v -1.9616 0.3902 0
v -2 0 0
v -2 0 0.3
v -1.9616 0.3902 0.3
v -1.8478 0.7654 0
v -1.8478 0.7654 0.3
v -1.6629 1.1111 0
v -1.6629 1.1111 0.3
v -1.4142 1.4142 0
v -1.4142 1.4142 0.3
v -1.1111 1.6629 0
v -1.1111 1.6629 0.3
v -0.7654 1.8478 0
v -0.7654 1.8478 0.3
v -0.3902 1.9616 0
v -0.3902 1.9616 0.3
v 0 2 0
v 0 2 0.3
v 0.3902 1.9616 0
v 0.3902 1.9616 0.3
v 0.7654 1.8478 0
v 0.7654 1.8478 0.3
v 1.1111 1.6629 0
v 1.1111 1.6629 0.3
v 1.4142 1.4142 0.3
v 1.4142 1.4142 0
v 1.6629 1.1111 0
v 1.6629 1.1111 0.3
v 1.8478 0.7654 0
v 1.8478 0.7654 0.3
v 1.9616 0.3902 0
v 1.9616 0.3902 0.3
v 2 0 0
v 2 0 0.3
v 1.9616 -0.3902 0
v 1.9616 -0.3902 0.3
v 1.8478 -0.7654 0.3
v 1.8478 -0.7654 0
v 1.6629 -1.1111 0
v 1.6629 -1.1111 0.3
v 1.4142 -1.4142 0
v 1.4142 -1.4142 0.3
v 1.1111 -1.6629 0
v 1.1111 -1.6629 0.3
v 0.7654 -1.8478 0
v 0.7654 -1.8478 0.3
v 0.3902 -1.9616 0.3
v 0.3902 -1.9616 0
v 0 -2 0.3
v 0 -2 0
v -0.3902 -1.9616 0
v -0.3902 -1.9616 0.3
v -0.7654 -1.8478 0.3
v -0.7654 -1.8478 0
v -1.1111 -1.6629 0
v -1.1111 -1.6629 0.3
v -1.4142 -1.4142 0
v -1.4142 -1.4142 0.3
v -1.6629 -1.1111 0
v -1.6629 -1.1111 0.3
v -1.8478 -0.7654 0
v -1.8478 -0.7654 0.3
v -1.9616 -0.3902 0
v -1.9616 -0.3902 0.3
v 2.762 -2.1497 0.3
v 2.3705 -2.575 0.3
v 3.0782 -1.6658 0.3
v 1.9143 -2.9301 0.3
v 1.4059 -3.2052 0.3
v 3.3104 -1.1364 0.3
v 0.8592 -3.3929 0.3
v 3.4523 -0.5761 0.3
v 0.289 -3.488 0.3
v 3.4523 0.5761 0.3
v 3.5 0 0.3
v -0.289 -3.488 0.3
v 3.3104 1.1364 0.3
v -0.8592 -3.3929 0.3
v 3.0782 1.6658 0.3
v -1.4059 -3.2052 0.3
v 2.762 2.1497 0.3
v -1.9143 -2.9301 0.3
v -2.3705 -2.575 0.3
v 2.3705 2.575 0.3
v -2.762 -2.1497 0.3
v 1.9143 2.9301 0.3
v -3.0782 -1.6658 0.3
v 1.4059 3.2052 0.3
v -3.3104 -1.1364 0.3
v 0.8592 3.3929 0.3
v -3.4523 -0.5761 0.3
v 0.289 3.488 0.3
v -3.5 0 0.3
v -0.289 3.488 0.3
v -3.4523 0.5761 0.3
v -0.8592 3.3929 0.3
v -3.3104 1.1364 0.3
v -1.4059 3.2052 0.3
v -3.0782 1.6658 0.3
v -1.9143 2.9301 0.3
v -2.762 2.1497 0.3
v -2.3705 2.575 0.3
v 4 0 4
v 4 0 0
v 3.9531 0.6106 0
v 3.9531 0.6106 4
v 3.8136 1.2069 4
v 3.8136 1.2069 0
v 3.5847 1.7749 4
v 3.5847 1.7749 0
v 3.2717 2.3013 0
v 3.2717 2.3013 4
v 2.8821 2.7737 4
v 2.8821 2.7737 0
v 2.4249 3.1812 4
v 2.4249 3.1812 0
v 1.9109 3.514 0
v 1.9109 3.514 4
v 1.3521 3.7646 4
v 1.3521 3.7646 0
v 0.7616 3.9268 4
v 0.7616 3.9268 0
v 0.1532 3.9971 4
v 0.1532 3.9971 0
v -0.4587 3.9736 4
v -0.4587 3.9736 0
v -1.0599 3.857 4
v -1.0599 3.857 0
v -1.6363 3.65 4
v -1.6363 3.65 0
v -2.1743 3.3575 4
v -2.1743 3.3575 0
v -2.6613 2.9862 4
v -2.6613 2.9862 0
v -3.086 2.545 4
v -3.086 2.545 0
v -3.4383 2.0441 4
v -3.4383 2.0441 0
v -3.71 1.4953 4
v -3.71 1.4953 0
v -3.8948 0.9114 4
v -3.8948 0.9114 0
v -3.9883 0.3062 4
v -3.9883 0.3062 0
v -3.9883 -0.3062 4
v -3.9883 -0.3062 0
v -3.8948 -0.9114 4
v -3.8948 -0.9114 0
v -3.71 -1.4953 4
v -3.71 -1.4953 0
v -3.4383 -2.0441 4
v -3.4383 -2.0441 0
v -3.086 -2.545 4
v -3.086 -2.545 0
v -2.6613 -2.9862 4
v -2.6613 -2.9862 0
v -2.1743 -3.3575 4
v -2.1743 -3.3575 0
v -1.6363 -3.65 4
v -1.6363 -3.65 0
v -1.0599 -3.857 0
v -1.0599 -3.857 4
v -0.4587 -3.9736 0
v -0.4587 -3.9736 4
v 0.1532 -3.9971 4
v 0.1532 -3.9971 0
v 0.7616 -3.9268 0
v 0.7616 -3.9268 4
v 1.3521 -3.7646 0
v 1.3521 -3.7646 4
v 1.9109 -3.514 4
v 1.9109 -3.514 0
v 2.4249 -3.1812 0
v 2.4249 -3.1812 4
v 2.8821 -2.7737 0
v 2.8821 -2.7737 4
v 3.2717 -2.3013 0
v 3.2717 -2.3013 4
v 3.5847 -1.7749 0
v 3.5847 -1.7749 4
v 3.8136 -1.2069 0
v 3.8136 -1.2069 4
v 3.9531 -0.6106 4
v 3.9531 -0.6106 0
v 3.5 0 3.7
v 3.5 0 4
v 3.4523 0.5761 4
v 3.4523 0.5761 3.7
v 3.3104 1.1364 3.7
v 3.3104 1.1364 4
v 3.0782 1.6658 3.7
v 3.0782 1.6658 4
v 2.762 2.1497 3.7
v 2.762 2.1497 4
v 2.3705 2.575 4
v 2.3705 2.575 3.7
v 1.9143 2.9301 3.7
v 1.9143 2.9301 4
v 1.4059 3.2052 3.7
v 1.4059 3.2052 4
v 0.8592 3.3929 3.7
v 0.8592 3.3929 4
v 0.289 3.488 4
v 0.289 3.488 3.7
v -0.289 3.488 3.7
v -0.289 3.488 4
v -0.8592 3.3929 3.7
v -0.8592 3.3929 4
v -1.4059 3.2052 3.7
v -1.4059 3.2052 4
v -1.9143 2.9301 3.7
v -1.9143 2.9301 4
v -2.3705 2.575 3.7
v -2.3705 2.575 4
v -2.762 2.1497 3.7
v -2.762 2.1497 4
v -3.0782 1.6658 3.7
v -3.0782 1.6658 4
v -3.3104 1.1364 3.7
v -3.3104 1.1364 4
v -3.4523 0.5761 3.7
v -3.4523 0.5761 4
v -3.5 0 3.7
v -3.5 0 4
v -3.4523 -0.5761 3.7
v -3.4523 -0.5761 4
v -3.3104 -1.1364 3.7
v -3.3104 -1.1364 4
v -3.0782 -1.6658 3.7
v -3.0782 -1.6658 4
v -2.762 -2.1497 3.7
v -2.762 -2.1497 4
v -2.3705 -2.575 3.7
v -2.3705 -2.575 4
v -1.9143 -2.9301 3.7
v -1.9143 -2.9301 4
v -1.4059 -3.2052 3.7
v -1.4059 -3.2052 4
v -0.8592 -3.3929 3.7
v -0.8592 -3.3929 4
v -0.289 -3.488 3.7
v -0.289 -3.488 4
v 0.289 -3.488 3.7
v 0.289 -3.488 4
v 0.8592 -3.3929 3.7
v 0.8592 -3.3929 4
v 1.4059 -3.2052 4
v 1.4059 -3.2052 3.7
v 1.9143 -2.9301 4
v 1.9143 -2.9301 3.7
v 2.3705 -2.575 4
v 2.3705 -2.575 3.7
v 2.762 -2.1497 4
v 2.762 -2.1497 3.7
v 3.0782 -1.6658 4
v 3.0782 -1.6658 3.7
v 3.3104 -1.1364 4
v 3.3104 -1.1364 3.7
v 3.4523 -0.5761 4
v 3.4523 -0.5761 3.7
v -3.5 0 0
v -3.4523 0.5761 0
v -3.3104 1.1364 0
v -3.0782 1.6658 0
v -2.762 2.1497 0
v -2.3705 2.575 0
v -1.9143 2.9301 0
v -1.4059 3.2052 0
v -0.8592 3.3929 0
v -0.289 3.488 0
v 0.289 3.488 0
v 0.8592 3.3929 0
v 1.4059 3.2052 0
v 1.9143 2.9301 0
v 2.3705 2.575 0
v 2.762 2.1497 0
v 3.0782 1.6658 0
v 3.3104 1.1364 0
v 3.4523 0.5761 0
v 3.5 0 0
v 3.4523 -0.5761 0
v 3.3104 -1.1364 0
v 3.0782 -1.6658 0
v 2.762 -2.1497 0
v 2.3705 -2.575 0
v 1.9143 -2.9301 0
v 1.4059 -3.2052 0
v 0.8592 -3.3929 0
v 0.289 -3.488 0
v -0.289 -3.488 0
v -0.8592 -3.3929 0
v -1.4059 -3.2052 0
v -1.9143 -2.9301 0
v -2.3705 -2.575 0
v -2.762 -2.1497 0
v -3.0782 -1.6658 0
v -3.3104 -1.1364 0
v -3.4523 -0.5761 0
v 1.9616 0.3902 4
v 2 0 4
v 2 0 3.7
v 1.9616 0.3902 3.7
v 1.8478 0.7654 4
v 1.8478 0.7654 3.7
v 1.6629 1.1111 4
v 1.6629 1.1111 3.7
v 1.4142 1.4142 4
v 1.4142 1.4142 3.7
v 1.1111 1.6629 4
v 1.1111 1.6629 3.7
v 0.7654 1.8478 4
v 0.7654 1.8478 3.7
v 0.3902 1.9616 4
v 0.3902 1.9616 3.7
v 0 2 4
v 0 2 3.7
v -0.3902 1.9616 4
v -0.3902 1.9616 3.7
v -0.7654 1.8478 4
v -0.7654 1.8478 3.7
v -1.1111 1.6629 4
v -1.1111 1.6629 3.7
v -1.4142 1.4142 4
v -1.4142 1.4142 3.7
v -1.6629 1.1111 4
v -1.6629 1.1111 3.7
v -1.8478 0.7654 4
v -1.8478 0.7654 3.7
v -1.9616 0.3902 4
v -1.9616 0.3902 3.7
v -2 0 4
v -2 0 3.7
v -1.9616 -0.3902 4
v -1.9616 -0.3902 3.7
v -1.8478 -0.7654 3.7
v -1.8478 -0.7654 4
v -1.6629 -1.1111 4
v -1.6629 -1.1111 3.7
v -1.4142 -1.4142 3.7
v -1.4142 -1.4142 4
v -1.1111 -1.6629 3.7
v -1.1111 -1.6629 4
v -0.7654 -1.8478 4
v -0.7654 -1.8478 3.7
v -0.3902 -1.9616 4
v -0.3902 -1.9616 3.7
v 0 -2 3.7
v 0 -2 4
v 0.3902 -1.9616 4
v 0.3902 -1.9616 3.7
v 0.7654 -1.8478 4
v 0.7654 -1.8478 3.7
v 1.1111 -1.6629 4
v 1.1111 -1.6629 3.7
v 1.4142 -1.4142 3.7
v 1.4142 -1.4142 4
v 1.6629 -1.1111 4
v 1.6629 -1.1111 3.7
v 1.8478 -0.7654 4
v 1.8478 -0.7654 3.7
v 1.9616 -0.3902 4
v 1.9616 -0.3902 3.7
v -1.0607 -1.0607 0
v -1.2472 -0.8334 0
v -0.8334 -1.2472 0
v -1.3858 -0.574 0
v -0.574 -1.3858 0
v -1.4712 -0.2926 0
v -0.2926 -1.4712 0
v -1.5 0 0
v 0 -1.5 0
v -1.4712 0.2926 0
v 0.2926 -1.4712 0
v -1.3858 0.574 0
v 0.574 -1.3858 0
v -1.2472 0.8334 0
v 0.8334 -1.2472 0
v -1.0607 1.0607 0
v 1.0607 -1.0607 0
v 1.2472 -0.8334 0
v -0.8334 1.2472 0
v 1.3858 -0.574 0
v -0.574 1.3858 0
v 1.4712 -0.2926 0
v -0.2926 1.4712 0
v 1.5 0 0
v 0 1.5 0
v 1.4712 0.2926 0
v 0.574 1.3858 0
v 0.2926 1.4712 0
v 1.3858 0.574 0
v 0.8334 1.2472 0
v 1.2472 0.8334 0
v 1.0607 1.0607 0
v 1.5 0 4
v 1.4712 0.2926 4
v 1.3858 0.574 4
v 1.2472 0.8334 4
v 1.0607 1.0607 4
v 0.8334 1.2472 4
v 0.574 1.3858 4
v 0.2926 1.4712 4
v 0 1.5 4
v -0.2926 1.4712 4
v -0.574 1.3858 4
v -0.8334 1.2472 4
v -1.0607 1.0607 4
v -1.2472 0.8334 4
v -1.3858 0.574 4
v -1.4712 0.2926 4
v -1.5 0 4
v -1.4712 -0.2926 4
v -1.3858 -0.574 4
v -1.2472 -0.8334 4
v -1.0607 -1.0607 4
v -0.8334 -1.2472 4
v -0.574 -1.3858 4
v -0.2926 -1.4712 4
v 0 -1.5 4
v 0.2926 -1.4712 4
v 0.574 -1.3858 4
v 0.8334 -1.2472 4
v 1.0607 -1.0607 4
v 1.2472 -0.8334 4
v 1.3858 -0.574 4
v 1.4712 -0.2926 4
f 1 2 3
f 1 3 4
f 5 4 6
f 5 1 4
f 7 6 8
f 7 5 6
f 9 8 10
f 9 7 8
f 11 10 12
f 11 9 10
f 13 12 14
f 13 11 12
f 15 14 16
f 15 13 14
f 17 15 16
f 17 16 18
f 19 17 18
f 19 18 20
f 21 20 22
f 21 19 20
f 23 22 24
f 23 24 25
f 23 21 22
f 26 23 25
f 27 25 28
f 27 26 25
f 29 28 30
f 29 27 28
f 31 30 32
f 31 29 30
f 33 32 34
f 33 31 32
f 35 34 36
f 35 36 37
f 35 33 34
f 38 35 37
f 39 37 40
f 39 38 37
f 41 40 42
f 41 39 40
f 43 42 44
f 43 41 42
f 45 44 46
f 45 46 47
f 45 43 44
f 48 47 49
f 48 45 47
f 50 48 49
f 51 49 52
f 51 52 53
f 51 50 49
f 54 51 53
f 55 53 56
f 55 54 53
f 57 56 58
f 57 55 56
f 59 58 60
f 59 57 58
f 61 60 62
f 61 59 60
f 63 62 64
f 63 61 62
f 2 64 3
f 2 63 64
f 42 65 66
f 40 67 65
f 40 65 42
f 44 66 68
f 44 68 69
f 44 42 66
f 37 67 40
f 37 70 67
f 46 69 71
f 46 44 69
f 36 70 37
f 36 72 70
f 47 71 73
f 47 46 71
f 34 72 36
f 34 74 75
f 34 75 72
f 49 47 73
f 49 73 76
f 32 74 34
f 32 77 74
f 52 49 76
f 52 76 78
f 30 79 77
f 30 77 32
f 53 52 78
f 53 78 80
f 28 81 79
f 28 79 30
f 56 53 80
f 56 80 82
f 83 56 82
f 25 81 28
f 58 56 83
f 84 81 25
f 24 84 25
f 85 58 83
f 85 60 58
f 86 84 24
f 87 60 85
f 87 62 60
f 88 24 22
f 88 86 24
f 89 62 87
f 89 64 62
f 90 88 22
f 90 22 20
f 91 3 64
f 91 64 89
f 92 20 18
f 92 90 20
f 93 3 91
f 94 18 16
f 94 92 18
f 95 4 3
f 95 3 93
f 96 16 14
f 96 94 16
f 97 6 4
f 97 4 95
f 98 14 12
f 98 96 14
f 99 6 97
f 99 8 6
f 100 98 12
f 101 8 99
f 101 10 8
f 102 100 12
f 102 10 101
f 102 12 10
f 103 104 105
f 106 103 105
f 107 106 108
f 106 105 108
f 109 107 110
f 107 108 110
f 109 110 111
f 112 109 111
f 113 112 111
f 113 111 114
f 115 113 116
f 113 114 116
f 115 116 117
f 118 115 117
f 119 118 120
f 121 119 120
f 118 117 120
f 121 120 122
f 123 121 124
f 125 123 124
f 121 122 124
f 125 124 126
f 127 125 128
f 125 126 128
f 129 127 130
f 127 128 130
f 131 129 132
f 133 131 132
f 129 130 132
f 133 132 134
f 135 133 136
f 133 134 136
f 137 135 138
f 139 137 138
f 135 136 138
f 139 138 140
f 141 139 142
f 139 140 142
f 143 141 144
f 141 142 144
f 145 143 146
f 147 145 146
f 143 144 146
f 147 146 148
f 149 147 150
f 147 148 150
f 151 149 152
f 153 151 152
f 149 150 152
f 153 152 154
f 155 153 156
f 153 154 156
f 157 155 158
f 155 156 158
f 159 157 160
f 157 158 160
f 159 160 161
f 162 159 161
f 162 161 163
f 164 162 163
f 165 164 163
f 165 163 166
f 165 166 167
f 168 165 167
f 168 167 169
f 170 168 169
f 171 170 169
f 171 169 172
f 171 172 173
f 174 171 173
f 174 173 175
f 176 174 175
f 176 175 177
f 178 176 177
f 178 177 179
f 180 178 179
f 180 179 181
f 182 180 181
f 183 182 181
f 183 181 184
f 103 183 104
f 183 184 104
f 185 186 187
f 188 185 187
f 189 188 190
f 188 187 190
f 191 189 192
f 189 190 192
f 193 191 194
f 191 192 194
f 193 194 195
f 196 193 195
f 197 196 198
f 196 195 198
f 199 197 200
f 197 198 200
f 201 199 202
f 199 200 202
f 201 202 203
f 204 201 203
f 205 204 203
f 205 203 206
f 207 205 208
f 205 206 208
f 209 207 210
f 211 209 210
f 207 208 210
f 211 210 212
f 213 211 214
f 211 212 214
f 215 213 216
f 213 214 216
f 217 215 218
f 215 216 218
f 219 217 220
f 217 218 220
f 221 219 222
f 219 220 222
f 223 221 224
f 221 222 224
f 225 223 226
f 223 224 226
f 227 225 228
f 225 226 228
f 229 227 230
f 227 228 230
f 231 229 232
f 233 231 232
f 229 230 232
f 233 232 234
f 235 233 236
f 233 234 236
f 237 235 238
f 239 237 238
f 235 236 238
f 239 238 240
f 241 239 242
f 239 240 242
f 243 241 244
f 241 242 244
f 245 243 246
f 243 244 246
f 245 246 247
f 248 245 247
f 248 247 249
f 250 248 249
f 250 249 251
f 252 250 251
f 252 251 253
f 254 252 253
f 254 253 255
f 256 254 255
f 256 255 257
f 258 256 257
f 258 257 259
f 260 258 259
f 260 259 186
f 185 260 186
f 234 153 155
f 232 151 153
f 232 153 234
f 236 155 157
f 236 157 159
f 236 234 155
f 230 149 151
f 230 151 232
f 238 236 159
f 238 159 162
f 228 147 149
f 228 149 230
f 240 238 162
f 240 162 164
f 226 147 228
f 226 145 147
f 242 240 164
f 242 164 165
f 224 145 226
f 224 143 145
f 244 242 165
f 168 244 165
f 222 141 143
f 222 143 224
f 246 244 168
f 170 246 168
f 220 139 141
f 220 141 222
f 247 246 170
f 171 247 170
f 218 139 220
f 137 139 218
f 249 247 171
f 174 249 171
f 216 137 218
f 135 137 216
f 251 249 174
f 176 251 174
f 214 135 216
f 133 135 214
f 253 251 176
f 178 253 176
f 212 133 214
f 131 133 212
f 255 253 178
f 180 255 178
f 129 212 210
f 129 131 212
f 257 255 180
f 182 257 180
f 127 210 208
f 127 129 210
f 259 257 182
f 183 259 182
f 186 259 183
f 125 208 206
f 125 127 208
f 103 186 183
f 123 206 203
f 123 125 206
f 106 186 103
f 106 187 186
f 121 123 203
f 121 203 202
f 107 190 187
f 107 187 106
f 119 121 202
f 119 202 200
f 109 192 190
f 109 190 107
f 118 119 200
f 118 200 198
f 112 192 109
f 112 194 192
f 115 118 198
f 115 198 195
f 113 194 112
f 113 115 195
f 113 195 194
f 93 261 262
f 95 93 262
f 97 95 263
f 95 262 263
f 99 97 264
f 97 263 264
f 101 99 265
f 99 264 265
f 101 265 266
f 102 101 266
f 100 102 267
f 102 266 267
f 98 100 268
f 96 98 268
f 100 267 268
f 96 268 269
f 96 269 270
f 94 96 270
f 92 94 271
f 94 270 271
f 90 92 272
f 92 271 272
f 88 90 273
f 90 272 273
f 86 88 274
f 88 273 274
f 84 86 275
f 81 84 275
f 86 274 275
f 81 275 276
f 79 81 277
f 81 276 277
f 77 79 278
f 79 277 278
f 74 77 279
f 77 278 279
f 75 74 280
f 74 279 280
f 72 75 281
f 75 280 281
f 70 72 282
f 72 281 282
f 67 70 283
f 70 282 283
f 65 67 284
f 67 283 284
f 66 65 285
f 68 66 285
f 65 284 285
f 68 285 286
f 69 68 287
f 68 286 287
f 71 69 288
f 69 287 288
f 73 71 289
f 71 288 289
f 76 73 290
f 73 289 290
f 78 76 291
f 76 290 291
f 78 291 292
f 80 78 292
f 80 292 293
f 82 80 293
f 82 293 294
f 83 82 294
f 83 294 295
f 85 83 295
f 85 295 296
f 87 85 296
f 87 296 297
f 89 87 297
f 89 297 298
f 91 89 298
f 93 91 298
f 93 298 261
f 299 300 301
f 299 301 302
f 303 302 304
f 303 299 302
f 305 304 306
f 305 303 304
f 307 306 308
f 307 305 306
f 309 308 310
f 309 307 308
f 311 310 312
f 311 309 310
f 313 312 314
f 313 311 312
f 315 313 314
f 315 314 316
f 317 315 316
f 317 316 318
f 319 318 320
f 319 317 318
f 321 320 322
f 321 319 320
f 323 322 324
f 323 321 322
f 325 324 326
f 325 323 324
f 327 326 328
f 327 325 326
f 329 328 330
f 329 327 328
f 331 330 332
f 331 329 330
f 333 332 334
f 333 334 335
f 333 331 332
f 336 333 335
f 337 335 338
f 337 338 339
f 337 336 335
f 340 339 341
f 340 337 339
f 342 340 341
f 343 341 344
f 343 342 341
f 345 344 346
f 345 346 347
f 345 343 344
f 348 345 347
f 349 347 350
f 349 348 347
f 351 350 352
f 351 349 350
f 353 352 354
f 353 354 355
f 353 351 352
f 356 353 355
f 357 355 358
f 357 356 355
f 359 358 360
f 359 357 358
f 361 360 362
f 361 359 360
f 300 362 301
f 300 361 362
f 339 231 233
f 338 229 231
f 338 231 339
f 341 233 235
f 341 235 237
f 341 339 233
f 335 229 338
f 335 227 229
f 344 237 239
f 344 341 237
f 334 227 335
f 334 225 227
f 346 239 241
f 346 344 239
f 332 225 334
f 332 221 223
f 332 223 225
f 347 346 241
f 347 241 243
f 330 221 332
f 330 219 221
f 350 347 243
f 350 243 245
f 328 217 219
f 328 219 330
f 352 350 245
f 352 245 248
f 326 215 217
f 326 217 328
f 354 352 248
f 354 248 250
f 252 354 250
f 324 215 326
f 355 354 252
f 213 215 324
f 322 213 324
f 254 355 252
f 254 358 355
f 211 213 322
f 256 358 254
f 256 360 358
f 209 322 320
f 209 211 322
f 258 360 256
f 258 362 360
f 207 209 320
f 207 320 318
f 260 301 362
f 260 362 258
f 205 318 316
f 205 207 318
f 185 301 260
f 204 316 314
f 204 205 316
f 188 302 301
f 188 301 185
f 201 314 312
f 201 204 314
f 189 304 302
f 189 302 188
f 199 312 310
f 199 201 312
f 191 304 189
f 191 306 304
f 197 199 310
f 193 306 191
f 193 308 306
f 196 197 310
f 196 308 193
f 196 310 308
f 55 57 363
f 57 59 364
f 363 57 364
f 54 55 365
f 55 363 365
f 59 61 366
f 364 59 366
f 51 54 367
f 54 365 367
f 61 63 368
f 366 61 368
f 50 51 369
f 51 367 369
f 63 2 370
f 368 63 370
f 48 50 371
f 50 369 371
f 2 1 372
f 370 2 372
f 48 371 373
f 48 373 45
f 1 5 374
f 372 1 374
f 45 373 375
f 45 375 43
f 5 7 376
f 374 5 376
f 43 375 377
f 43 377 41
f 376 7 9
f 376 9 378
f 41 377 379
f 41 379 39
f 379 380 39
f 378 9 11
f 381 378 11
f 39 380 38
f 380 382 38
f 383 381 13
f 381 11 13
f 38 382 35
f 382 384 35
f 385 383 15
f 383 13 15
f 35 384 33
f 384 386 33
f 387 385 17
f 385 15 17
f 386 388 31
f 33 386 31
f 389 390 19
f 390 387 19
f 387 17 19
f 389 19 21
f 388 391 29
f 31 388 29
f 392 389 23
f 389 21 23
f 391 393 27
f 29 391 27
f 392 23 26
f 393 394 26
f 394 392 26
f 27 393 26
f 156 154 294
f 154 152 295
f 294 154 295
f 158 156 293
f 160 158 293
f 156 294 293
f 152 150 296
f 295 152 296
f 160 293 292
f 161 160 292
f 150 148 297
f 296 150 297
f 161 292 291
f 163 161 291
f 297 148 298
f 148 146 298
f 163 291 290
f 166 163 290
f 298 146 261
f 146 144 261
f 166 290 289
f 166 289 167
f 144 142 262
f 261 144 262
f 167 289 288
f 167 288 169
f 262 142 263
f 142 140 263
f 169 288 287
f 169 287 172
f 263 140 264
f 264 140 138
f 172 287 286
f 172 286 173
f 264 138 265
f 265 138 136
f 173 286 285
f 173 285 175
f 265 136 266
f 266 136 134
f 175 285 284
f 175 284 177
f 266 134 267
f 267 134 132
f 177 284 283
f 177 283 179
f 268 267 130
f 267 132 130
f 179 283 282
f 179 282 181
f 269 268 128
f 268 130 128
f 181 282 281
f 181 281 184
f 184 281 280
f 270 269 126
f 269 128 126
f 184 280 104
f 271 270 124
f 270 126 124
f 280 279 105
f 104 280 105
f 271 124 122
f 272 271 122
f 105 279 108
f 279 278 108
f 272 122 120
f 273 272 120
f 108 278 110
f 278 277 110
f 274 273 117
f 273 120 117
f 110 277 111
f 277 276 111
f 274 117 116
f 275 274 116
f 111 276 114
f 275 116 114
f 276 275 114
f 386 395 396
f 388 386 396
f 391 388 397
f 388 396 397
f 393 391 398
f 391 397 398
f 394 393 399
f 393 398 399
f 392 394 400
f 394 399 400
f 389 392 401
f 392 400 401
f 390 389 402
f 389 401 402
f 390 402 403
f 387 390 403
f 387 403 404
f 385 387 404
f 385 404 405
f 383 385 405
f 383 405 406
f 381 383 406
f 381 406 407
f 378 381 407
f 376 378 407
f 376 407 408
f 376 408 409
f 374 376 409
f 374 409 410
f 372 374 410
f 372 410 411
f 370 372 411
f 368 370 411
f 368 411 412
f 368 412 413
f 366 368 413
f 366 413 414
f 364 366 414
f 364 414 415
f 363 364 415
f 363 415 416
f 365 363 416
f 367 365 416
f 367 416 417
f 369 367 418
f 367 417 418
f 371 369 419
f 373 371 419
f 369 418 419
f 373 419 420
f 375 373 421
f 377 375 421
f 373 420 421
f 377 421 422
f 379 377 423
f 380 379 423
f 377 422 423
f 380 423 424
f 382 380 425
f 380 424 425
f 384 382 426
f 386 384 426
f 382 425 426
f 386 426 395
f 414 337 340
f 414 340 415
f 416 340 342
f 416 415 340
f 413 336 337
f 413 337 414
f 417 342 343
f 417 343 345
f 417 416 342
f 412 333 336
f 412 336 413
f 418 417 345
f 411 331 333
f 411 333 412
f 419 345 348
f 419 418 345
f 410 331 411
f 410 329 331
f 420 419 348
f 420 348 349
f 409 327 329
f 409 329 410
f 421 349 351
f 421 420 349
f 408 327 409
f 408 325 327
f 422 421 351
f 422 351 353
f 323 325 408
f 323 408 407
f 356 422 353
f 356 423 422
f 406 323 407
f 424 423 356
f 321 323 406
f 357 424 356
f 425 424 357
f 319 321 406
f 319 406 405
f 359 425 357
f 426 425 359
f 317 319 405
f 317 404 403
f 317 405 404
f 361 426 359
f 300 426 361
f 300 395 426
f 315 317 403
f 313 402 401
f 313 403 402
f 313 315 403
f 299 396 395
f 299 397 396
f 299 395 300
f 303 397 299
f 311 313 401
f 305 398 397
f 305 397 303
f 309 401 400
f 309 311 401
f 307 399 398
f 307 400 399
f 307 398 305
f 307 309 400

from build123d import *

# Parameters (mm, degrees)
SKETCH_1_R          = 4
EXTRUDE_1_DEPTH     = 4
SKETCH_2_R          = 1.5
CUT_EXTRUDE_1_DEPTH = 5
SKETCH_3_R          = 3.5
SKETCH_3_R_2        = 2
CUT_EXTRUDE_2_DEPTH = 0.3
SKETCH_4_R          = 3.5
SKETCH_4_R_2        = 2
CUT_EXTRUDE_3_DEPTH = 0.3


with BuildPart() as part:
    # 草圖1 → 填料-伸長1 (new body)
    with BuildSketch(Plane.XY):
        Circle(SKETCH_1_R)
    extrude(amount=EXTRUDE_1_DEPTH)

    # 草圖2 → 除料-伸長1 (cut, through all)
    with BuildSketch(Plane.XY.offset(4)):
        Circle(SKETCH_2_R)
    extrude(amount=-CUT_EXTRUDE_1_DEPTH, mode=Mode.SUBTRACT)

    # 草圖3 → 除料-伸長2 (cut)
    with BuildSketch(Plane.XY.offset(4)):
        Circle(SKETCH_3_R)
        Circle(SKETCH_3_R_2, mode=Mode.SUBTRACT)
    extrude(amount=-CUT_EXTRUDE_2_DEPTH, mode=Mode.SUBTRACT)

    # 草圖4 → 除料-伸長3 (cut)
    with BuildSketch(Plane(origin=(0, 0, 0), x_dir=(-1, 0, 0), z_dir=(0, 0, -1))):
        Circle(SKETCH_4_R)
        Circle(SKETCH_4_R_2, mode=Mode.SUBTRACT)
    extrude(amount=-CUT_EXTRUDE_3_DEPTH, mode=Mode.SUBTRACT)


solid = part.part
